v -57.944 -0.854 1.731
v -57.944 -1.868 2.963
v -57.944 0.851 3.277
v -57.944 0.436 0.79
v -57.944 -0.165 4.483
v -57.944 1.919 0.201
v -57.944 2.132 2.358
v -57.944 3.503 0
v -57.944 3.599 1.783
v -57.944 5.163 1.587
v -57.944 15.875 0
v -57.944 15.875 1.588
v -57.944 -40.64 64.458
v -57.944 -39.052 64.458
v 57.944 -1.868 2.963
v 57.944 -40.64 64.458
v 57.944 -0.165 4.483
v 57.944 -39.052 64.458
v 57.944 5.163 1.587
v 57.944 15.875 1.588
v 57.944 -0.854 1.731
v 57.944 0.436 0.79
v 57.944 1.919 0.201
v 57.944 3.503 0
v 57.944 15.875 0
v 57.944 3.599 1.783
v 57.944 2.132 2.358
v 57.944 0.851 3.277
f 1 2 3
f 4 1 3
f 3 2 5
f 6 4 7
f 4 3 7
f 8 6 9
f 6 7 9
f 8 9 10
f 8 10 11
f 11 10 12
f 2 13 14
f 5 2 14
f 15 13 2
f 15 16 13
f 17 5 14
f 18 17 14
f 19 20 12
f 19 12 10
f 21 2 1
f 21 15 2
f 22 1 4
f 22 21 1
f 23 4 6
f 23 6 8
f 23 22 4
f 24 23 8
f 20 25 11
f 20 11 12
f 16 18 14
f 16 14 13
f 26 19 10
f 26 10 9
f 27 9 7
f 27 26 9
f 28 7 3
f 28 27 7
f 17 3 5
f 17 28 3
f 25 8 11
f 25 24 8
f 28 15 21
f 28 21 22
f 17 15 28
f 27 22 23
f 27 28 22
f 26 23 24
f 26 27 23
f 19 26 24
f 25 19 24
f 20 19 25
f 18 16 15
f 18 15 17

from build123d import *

# Parameters (mm, degrees)
F1_DEPTH = 57.94375


with BuildPart() as f1:
    # F0 (on Right) → F1 (new body, symmetric)
    with BuildSketch(Plane.YZ):
        with BuildLine():
            Line((3.503151, 0), (15.875, 0))
            Line((15.875, 0), (15.875, 1.5875))
            Line((15.875, 1.5875), (5.163465, 1.5875))
            ThreePointArc((5.163465, 1.5875), (2.131531, 2.358085), (-0.164541, 4.482815))
            Line((-0.164541, 4.482815), (-39.0525, 64.457974))
            Line((-39.0525, 64.457974), (-40.64, 64.457974))
            Line((-40.64, 64.457974), (-1.868347, 2.963333))
            ThreePointArc((-1.868347, 2.963333), (0.435809, 0.789972), (3.503151, 0))
        make_face()
    extrude(amount=F1_DEPTH, both=True)


solid = f1.part
